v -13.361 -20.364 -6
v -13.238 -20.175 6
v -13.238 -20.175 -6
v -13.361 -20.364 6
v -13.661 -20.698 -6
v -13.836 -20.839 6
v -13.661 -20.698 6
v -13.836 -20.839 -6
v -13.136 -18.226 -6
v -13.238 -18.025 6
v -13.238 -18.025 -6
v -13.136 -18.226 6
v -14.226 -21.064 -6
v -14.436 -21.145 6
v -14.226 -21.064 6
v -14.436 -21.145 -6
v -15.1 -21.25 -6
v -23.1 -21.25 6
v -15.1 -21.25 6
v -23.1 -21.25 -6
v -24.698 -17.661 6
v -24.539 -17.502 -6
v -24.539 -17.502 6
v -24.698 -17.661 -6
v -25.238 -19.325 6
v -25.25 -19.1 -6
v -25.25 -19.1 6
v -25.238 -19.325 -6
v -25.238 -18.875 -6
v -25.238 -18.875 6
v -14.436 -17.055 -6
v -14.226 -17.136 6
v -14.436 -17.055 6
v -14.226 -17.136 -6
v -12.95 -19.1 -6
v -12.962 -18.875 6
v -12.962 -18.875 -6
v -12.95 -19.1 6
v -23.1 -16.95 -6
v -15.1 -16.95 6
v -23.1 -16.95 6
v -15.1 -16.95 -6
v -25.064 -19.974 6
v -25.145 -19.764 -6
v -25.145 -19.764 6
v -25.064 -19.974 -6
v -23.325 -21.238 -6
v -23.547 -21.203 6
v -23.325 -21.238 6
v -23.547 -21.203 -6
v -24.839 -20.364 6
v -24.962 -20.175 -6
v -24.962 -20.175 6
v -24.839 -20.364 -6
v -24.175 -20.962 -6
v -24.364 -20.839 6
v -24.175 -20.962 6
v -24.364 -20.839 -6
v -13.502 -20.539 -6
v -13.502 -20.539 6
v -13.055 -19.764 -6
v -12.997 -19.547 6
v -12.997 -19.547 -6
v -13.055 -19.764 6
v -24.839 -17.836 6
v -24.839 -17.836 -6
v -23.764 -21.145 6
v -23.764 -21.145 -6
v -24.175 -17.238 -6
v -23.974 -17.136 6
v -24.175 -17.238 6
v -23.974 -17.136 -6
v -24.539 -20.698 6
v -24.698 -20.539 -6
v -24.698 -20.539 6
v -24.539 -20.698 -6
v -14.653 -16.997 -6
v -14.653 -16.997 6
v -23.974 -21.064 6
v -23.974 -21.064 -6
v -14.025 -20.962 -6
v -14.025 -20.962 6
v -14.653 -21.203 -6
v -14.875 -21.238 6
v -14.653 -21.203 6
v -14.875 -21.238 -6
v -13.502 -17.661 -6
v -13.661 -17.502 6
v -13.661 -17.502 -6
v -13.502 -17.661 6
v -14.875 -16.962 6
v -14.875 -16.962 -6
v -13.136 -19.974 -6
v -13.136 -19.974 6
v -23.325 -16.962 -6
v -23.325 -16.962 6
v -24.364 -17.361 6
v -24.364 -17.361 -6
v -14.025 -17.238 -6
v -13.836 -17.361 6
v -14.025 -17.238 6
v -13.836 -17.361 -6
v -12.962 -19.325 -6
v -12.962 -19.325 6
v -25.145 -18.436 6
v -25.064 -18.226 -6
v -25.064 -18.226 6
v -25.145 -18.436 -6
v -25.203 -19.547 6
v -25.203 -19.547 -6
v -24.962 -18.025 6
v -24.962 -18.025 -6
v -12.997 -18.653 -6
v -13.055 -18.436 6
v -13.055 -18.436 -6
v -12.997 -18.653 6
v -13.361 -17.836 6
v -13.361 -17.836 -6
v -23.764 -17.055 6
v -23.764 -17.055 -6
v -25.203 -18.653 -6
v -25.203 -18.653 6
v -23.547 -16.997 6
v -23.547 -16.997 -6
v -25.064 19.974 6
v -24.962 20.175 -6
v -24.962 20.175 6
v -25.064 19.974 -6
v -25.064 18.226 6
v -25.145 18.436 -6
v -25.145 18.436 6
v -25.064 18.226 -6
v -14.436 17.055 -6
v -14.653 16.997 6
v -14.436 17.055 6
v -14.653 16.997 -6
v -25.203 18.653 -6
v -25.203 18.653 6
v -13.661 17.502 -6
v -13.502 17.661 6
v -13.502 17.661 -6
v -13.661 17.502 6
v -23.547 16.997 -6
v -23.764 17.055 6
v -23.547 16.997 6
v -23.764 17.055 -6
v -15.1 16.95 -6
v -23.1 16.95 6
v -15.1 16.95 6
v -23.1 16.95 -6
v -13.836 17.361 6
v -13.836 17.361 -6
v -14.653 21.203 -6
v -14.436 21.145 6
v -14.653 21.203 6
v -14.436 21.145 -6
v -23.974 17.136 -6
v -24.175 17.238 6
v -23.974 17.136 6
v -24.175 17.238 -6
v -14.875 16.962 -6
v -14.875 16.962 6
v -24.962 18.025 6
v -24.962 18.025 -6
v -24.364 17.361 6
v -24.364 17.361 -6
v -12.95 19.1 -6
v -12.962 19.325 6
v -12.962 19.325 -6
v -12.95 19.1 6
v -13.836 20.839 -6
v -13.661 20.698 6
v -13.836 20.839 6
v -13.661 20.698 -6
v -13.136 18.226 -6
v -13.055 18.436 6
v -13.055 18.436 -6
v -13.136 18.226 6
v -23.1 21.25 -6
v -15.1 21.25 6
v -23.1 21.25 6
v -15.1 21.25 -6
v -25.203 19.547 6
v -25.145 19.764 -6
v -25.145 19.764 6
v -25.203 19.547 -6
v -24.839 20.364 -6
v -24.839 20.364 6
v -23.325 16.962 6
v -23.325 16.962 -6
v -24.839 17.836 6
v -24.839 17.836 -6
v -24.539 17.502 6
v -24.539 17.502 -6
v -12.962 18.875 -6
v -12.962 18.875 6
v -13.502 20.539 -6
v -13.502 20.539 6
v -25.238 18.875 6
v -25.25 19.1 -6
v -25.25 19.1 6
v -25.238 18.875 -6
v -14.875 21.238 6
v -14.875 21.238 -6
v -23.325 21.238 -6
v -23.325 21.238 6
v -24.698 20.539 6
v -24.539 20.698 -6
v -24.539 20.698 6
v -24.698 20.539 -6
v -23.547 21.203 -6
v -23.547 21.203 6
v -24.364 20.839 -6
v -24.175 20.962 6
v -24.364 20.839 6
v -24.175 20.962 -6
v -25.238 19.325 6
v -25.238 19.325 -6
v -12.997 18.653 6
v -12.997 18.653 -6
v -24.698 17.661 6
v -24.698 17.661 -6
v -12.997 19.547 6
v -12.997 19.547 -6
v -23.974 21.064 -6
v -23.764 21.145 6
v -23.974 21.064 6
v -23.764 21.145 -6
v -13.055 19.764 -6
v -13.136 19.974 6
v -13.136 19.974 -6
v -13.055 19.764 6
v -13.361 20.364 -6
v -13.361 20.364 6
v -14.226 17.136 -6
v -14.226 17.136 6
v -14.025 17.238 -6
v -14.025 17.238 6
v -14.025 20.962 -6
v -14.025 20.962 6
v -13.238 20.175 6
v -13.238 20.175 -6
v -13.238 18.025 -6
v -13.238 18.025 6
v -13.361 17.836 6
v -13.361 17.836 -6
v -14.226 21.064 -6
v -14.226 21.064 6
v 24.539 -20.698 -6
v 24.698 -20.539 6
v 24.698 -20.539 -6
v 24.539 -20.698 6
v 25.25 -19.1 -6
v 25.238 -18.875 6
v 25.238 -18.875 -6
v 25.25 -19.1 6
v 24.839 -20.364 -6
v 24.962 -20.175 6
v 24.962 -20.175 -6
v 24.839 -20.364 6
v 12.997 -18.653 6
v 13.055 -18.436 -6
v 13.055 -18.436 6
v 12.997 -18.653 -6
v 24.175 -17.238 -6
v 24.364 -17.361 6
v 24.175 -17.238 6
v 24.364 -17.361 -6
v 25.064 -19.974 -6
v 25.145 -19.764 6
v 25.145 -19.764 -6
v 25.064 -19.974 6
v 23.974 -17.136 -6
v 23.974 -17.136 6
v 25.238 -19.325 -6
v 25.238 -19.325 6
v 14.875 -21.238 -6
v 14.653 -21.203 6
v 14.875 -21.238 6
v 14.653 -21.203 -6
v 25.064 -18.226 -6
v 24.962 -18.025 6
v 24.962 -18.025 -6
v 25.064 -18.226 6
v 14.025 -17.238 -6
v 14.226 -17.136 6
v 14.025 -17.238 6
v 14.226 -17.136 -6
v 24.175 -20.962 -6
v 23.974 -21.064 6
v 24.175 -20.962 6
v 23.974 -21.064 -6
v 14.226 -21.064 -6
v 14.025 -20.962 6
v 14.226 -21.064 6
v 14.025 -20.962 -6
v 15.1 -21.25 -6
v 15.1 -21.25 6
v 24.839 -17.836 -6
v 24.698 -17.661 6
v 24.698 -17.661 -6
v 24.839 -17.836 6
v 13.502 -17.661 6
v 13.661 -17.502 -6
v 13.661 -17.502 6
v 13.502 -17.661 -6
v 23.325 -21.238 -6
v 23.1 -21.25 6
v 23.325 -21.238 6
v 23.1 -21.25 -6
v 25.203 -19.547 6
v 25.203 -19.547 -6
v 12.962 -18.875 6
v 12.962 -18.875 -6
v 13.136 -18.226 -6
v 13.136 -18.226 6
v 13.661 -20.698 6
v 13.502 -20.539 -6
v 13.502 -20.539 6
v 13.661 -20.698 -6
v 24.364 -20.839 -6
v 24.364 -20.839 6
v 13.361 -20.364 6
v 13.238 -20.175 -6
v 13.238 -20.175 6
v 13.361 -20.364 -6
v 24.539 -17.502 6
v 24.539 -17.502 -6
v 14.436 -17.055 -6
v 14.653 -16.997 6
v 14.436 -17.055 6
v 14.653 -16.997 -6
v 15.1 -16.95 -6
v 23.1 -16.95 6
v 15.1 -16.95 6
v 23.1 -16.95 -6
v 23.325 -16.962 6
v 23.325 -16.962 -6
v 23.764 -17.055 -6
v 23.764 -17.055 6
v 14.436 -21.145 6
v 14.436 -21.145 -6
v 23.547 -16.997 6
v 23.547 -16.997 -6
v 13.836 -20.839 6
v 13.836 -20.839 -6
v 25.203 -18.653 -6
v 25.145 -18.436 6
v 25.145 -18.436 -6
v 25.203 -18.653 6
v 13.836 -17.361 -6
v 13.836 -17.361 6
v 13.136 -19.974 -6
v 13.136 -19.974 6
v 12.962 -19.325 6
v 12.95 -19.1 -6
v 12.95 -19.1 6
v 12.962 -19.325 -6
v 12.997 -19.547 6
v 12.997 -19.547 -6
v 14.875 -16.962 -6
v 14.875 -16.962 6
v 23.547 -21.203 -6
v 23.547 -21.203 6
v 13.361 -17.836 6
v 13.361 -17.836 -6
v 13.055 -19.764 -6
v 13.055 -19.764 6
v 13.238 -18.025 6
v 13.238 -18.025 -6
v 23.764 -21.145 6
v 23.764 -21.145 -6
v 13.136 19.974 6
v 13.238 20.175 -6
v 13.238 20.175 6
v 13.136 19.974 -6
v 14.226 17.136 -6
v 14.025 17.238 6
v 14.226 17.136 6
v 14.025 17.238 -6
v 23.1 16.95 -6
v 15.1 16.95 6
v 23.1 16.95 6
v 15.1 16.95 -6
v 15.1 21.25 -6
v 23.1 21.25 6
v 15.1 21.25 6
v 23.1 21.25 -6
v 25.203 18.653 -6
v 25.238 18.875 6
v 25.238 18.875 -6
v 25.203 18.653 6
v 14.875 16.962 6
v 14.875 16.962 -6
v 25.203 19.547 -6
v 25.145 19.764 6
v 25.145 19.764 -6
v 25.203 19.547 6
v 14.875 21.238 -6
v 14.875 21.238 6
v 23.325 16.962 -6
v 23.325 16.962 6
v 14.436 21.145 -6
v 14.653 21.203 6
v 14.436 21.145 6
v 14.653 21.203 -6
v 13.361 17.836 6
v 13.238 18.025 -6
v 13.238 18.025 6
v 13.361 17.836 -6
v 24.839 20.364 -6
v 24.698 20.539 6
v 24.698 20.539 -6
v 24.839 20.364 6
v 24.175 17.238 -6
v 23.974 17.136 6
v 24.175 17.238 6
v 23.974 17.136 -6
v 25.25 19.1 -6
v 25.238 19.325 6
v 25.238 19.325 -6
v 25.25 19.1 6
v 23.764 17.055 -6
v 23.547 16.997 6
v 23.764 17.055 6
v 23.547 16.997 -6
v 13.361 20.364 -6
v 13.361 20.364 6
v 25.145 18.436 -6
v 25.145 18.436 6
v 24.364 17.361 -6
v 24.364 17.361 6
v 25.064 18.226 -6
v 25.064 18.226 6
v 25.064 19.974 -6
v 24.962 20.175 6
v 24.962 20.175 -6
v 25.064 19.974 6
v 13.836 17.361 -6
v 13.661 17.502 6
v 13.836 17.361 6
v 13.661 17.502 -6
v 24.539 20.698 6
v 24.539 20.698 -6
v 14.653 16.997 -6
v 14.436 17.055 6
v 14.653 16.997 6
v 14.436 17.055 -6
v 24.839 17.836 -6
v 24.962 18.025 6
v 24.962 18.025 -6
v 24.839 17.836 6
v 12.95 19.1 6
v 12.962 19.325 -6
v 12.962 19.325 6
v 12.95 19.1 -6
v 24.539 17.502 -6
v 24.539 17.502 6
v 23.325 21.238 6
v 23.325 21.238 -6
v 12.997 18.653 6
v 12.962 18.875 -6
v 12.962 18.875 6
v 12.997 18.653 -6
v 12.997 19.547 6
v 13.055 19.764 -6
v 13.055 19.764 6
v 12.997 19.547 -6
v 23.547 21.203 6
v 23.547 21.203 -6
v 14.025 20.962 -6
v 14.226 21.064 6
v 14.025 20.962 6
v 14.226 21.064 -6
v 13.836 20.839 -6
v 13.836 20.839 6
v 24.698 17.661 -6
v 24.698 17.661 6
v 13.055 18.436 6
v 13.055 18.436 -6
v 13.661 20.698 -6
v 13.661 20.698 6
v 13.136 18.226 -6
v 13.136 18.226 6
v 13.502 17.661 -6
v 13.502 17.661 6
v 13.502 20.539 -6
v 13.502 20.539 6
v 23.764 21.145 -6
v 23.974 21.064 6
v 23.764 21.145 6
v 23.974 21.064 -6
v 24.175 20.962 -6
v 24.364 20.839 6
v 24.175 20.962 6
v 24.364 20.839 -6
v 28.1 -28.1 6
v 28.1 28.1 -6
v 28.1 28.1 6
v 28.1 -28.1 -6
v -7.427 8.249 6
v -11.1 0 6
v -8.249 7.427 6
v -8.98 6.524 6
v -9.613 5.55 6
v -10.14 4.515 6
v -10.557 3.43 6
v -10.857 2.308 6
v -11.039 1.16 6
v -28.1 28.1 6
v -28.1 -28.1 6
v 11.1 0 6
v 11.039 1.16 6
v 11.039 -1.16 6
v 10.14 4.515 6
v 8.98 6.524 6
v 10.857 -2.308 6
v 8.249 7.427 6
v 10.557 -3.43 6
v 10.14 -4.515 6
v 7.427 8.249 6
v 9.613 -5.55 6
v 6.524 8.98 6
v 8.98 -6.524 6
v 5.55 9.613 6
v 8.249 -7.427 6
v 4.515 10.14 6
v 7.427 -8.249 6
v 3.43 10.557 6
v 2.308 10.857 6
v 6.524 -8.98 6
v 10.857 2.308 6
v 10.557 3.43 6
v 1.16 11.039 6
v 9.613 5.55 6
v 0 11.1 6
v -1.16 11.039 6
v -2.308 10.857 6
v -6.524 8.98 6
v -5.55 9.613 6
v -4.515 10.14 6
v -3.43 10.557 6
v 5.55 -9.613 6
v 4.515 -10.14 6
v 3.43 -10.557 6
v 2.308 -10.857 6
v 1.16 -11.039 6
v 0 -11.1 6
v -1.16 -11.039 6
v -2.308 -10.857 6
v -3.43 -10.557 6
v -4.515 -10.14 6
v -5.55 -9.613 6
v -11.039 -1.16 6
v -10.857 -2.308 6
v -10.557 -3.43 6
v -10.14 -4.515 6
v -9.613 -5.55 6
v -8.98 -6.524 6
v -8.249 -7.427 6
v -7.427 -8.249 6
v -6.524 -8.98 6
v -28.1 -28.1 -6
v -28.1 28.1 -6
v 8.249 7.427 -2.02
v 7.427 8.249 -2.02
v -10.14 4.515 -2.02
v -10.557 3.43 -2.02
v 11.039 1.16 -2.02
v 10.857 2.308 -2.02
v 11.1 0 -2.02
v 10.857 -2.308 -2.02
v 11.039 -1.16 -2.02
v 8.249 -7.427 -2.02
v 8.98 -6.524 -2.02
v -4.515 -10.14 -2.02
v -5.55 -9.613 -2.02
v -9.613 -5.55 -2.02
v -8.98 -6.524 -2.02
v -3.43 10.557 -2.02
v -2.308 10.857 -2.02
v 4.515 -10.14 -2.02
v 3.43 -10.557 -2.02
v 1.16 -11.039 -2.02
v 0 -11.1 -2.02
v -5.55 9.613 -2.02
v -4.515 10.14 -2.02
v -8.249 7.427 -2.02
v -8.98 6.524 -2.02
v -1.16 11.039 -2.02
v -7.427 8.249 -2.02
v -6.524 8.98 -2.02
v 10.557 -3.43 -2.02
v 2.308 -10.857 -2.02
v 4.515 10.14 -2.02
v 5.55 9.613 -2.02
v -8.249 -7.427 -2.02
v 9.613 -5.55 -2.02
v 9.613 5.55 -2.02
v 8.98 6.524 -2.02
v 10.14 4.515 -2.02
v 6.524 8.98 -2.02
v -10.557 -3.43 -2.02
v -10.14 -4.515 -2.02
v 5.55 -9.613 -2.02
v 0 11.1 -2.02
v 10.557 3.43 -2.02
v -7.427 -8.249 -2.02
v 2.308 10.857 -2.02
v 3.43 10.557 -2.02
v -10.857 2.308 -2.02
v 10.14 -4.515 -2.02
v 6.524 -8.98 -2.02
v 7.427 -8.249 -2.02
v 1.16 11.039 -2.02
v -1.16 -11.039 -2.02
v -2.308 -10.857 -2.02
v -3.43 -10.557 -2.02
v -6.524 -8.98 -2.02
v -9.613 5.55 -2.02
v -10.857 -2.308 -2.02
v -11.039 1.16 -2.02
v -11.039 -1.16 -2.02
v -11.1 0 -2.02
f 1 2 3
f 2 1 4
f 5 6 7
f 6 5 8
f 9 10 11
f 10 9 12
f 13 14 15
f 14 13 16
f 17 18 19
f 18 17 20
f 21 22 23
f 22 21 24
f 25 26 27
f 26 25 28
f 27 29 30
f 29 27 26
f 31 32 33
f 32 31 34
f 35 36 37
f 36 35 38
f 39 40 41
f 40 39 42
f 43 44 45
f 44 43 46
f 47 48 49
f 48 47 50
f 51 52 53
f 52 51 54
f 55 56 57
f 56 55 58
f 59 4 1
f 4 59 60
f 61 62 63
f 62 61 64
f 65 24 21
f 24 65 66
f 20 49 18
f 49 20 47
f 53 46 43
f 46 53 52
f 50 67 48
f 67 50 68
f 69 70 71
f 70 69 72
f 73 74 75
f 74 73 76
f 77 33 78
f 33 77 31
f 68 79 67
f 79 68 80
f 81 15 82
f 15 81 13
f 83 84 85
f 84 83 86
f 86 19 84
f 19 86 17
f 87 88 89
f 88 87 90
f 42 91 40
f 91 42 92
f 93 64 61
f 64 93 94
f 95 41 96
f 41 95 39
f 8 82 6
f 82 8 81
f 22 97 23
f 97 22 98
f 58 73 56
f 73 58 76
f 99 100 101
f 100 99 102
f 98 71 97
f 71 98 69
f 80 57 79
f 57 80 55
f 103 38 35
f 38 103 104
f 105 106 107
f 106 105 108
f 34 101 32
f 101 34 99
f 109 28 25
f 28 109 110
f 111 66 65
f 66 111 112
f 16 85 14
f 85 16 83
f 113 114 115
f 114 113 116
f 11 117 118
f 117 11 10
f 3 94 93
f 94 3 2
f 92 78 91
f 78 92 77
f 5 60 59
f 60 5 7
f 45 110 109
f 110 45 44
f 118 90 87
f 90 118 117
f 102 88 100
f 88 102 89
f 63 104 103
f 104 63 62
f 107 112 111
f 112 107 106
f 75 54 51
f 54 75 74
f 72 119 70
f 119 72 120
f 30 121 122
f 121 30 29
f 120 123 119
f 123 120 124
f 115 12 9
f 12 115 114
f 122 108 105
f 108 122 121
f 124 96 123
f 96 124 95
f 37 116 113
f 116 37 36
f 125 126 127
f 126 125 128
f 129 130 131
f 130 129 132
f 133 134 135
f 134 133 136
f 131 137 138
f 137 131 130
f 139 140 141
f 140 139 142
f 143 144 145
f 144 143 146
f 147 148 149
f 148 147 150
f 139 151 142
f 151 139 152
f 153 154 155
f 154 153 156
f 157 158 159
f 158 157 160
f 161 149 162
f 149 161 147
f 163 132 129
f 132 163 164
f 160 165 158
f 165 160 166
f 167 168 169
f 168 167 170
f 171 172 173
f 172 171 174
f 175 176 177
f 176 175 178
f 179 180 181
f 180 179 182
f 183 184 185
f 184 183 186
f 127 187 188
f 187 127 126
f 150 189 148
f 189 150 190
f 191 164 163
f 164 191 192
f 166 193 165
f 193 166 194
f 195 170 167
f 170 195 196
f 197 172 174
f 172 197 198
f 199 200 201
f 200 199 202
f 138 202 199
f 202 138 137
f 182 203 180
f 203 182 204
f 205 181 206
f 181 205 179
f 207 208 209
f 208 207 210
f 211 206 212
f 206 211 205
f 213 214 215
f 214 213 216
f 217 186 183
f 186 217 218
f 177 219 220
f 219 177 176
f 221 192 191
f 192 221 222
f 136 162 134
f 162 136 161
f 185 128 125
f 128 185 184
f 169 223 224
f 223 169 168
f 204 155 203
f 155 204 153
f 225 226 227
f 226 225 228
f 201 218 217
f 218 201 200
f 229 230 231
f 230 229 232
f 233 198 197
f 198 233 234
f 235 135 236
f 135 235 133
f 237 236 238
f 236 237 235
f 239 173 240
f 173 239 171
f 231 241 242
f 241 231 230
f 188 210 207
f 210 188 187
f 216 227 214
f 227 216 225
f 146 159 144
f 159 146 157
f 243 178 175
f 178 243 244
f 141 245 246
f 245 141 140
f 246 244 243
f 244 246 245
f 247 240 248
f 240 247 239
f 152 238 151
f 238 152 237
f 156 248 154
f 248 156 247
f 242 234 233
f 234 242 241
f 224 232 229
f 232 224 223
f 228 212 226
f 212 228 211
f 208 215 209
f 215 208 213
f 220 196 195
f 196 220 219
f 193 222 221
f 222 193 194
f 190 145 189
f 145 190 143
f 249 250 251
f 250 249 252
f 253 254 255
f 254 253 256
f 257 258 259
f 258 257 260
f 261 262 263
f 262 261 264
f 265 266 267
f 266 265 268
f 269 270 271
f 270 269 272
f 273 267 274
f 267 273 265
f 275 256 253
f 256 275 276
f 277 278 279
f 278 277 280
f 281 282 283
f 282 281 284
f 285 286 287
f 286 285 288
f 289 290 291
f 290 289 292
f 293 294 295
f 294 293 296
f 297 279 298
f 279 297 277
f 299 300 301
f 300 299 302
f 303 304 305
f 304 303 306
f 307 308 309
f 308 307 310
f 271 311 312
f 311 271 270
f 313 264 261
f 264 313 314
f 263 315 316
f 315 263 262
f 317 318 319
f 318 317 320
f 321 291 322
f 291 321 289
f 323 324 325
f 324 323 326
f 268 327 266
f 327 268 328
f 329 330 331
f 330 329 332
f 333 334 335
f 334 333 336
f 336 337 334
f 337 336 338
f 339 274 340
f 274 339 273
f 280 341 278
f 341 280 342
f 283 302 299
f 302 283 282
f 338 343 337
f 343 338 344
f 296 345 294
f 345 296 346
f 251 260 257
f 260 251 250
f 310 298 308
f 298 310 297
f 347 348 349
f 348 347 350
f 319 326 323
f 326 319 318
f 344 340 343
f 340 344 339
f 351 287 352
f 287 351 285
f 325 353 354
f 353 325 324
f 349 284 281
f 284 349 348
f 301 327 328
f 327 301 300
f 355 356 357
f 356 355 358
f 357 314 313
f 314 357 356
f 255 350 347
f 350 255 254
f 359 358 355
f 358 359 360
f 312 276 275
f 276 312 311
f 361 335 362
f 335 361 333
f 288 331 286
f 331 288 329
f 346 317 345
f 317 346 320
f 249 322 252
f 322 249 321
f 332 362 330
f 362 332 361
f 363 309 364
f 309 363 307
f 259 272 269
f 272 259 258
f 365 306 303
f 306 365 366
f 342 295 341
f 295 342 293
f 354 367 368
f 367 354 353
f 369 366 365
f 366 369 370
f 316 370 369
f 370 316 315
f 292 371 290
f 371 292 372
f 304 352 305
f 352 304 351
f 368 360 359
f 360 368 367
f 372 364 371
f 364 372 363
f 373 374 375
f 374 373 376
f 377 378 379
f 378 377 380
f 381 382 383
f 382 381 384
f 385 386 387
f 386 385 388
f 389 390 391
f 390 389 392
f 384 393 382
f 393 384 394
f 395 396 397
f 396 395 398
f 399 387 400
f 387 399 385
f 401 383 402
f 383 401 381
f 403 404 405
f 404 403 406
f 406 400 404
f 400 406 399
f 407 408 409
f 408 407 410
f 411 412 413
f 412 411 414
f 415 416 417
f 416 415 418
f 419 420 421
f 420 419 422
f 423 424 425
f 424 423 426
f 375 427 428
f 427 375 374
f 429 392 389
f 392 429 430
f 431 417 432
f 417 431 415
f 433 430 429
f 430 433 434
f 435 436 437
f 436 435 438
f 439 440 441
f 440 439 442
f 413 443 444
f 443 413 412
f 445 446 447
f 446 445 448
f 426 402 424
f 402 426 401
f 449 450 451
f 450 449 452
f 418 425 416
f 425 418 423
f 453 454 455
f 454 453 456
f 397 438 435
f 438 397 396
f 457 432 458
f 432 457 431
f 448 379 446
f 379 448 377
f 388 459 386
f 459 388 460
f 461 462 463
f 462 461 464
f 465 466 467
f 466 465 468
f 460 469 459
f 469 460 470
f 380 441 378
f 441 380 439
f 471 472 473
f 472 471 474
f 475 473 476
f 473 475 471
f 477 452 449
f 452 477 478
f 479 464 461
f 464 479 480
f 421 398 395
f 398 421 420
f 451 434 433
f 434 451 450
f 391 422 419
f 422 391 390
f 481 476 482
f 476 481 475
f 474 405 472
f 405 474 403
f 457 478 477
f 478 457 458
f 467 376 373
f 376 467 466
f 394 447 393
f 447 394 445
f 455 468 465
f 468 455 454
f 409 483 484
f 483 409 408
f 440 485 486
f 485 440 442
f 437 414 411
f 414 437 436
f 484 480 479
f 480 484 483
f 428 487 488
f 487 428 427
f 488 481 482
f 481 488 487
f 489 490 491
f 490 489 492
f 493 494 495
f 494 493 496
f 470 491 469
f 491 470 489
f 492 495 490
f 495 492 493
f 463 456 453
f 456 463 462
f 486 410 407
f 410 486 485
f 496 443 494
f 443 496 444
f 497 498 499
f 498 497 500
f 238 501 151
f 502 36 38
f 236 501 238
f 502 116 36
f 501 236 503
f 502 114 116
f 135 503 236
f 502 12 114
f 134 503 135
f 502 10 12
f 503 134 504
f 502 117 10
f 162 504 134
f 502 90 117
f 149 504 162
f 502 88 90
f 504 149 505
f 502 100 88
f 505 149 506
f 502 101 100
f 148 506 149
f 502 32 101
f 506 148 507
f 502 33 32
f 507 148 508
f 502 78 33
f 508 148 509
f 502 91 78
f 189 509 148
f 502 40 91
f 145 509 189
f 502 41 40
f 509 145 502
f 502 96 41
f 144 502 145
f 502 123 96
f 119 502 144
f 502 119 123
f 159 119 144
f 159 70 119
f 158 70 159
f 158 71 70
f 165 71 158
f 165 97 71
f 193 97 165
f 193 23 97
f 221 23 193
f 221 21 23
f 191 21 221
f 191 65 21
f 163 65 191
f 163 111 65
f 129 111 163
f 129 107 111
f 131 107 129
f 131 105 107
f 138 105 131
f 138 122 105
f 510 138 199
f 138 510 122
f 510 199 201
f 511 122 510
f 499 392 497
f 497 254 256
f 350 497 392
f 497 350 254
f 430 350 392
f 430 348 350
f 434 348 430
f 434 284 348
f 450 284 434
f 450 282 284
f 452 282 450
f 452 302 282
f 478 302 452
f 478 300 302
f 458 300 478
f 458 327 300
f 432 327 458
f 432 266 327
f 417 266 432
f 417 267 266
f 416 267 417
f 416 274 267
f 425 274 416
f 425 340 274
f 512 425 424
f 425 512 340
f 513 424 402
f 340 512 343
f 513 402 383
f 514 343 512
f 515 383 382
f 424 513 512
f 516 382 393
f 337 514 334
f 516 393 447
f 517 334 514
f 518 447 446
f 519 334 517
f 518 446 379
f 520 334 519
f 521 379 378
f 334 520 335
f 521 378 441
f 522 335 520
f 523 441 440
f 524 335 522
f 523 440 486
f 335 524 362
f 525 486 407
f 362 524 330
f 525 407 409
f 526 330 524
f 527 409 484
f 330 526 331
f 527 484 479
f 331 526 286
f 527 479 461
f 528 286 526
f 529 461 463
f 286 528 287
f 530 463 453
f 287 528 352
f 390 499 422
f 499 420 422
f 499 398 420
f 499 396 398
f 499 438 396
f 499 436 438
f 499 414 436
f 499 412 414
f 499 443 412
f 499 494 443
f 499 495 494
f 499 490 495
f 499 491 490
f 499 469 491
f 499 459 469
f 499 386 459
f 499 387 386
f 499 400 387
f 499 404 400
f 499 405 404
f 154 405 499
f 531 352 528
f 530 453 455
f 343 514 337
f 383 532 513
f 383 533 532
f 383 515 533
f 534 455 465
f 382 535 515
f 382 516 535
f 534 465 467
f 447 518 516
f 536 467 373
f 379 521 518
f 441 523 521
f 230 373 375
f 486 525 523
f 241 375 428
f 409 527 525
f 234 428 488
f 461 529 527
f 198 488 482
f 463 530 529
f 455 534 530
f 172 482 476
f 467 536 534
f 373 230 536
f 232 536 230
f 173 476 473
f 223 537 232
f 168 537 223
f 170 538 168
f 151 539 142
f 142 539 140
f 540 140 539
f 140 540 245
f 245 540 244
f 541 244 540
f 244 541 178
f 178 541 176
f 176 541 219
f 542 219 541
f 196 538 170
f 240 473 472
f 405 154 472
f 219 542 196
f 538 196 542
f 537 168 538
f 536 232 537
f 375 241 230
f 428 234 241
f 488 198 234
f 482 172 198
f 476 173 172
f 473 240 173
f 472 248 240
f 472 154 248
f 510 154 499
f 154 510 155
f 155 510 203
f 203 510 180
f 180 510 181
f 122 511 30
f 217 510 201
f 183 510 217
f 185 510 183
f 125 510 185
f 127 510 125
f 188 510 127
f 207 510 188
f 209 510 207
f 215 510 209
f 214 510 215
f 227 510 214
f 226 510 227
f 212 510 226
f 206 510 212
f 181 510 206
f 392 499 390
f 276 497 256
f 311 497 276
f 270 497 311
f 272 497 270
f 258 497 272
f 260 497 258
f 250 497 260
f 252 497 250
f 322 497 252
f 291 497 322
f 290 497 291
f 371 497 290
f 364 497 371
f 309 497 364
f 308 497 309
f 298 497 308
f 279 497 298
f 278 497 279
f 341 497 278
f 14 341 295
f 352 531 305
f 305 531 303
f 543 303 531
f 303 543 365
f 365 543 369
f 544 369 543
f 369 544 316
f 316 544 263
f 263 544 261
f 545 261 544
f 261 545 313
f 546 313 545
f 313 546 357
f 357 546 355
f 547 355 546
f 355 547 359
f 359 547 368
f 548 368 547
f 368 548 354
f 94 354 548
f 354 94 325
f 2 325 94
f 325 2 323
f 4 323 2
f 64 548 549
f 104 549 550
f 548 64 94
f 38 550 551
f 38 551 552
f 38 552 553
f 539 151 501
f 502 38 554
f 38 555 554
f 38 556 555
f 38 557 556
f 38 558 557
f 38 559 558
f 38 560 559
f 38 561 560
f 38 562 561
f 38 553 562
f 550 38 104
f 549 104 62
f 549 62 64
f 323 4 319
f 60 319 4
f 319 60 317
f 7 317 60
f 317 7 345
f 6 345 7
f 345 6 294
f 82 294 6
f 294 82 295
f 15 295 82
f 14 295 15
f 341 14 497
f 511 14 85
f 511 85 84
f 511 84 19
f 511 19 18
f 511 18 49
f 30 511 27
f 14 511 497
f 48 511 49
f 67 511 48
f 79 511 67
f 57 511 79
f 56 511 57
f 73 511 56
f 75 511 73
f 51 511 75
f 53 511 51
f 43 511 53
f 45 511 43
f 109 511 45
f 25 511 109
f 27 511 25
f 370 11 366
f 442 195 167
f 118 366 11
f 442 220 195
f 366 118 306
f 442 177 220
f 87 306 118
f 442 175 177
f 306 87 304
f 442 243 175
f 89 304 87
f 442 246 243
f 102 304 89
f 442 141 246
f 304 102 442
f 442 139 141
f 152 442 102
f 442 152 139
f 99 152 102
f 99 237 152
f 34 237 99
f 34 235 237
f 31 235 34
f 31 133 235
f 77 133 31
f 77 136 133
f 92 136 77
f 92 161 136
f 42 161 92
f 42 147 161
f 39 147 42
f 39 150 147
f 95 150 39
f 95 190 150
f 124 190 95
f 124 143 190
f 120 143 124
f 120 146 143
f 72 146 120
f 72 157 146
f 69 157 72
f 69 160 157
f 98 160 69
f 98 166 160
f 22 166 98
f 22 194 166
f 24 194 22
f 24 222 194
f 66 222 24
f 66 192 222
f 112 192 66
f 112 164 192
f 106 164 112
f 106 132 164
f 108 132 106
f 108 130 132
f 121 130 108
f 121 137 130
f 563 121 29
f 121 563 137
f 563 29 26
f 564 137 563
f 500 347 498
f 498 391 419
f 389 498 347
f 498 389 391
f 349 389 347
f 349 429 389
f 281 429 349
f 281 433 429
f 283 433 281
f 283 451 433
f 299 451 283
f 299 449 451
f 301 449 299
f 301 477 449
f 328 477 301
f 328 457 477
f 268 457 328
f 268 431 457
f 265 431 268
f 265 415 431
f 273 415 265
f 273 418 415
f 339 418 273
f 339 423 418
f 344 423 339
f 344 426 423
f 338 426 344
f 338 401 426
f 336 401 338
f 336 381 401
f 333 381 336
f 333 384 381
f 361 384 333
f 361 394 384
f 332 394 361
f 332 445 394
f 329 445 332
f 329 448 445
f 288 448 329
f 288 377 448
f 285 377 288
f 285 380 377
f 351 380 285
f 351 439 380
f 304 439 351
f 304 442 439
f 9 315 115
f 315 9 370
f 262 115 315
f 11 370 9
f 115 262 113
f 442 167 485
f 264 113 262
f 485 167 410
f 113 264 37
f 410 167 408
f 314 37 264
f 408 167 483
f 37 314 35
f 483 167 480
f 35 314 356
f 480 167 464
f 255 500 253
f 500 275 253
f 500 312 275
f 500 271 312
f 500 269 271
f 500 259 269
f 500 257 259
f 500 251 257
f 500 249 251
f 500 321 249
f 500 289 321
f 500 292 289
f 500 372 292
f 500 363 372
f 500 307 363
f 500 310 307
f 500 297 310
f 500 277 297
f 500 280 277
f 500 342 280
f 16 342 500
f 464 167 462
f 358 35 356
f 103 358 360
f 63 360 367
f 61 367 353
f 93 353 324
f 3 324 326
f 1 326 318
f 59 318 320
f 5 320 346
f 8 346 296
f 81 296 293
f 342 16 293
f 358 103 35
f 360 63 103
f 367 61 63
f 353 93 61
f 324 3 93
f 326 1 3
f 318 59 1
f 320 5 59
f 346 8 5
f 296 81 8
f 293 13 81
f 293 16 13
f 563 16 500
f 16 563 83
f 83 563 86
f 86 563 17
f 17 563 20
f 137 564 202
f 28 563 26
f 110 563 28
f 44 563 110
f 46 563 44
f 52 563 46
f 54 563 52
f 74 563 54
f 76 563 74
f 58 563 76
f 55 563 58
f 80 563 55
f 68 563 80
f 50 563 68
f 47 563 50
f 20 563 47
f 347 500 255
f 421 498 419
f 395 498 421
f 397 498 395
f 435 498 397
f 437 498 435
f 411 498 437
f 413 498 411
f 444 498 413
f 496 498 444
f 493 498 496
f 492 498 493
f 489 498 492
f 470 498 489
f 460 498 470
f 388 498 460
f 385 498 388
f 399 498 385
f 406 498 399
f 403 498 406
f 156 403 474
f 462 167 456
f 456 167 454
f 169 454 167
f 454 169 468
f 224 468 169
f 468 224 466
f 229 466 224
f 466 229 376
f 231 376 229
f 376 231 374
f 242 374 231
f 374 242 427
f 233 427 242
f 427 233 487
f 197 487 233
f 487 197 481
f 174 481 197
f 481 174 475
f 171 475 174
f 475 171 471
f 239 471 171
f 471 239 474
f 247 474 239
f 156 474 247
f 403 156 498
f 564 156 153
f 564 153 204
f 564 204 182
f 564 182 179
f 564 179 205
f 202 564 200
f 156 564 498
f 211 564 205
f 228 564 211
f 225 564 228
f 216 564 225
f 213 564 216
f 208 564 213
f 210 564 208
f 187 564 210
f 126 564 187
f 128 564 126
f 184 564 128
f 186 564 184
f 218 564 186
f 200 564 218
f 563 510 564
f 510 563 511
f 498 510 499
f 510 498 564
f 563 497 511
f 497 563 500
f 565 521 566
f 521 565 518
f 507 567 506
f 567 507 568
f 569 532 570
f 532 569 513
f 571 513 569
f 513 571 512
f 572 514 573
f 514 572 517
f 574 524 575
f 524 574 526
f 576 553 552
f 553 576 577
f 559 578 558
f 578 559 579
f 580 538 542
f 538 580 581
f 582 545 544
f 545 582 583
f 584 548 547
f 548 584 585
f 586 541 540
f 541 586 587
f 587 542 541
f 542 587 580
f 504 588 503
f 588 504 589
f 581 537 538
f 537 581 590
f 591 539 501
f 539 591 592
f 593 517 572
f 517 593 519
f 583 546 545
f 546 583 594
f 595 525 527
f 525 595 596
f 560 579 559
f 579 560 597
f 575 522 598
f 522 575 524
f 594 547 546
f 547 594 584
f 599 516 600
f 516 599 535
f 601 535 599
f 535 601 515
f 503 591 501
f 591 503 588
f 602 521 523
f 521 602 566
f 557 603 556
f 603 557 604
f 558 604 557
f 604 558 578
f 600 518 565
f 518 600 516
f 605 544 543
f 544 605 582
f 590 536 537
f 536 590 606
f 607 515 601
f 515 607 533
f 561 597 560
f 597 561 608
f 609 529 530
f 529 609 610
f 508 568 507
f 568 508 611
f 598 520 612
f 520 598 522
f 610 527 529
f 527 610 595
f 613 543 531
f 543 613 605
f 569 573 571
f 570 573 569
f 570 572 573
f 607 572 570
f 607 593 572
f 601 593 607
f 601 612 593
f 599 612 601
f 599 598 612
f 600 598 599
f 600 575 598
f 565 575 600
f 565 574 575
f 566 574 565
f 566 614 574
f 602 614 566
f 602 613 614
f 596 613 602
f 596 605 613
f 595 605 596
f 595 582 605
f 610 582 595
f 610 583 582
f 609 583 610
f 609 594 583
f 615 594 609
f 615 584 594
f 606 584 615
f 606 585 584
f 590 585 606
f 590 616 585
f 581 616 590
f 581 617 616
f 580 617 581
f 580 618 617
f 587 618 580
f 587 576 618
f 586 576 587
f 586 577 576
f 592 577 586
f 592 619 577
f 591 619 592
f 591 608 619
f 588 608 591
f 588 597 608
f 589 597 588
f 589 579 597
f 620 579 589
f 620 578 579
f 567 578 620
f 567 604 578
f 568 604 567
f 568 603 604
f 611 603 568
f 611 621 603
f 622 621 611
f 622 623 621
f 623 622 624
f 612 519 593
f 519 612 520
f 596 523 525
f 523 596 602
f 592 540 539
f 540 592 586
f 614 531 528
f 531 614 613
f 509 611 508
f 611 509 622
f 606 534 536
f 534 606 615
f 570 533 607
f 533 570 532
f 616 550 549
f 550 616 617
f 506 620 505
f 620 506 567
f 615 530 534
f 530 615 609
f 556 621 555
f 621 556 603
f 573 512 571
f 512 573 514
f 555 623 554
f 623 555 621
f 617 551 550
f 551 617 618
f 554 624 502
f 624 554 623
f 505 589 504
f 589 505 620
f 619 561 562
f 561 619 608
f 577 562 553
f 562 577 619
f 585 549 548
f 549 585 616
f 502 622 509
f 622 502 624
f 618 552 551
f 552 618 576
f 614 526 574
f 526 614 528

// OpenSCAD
// Bearing mounting plate with 22.2 mm pocket.
$fn = 60;
eps = 0.02;
plate_w = 56.2;
plate_t = 12;
bearing_d = 22.2;
pocket_d = 8;
mount_pitch = 38.2;
module slot(x, y) {
    hull() {
        translate([x - 4, y, -plate_t / 2 - eps]) cylinder(d = 4.3, h = plate_t + 2 * eps);
        translate([x + 4, y, -plate_t / 2 - eps]) cylinder(d = 4.3, h = plate_t + 2 * eps);
    }
}
difference() {
    cube([plate_w, plate_w, plate_t], center = true);
    translate([0, 0, plate_t / 2 - pocket_d - eps]) cylinder(d = bearing_d, h = pocket_d + 2 * eps);
    for (x = [-mount_pitch / 2, mount_pitch / 2], y = [-mount_pitch / 2, mount_pitch / 2]) slot(x, y);
}
